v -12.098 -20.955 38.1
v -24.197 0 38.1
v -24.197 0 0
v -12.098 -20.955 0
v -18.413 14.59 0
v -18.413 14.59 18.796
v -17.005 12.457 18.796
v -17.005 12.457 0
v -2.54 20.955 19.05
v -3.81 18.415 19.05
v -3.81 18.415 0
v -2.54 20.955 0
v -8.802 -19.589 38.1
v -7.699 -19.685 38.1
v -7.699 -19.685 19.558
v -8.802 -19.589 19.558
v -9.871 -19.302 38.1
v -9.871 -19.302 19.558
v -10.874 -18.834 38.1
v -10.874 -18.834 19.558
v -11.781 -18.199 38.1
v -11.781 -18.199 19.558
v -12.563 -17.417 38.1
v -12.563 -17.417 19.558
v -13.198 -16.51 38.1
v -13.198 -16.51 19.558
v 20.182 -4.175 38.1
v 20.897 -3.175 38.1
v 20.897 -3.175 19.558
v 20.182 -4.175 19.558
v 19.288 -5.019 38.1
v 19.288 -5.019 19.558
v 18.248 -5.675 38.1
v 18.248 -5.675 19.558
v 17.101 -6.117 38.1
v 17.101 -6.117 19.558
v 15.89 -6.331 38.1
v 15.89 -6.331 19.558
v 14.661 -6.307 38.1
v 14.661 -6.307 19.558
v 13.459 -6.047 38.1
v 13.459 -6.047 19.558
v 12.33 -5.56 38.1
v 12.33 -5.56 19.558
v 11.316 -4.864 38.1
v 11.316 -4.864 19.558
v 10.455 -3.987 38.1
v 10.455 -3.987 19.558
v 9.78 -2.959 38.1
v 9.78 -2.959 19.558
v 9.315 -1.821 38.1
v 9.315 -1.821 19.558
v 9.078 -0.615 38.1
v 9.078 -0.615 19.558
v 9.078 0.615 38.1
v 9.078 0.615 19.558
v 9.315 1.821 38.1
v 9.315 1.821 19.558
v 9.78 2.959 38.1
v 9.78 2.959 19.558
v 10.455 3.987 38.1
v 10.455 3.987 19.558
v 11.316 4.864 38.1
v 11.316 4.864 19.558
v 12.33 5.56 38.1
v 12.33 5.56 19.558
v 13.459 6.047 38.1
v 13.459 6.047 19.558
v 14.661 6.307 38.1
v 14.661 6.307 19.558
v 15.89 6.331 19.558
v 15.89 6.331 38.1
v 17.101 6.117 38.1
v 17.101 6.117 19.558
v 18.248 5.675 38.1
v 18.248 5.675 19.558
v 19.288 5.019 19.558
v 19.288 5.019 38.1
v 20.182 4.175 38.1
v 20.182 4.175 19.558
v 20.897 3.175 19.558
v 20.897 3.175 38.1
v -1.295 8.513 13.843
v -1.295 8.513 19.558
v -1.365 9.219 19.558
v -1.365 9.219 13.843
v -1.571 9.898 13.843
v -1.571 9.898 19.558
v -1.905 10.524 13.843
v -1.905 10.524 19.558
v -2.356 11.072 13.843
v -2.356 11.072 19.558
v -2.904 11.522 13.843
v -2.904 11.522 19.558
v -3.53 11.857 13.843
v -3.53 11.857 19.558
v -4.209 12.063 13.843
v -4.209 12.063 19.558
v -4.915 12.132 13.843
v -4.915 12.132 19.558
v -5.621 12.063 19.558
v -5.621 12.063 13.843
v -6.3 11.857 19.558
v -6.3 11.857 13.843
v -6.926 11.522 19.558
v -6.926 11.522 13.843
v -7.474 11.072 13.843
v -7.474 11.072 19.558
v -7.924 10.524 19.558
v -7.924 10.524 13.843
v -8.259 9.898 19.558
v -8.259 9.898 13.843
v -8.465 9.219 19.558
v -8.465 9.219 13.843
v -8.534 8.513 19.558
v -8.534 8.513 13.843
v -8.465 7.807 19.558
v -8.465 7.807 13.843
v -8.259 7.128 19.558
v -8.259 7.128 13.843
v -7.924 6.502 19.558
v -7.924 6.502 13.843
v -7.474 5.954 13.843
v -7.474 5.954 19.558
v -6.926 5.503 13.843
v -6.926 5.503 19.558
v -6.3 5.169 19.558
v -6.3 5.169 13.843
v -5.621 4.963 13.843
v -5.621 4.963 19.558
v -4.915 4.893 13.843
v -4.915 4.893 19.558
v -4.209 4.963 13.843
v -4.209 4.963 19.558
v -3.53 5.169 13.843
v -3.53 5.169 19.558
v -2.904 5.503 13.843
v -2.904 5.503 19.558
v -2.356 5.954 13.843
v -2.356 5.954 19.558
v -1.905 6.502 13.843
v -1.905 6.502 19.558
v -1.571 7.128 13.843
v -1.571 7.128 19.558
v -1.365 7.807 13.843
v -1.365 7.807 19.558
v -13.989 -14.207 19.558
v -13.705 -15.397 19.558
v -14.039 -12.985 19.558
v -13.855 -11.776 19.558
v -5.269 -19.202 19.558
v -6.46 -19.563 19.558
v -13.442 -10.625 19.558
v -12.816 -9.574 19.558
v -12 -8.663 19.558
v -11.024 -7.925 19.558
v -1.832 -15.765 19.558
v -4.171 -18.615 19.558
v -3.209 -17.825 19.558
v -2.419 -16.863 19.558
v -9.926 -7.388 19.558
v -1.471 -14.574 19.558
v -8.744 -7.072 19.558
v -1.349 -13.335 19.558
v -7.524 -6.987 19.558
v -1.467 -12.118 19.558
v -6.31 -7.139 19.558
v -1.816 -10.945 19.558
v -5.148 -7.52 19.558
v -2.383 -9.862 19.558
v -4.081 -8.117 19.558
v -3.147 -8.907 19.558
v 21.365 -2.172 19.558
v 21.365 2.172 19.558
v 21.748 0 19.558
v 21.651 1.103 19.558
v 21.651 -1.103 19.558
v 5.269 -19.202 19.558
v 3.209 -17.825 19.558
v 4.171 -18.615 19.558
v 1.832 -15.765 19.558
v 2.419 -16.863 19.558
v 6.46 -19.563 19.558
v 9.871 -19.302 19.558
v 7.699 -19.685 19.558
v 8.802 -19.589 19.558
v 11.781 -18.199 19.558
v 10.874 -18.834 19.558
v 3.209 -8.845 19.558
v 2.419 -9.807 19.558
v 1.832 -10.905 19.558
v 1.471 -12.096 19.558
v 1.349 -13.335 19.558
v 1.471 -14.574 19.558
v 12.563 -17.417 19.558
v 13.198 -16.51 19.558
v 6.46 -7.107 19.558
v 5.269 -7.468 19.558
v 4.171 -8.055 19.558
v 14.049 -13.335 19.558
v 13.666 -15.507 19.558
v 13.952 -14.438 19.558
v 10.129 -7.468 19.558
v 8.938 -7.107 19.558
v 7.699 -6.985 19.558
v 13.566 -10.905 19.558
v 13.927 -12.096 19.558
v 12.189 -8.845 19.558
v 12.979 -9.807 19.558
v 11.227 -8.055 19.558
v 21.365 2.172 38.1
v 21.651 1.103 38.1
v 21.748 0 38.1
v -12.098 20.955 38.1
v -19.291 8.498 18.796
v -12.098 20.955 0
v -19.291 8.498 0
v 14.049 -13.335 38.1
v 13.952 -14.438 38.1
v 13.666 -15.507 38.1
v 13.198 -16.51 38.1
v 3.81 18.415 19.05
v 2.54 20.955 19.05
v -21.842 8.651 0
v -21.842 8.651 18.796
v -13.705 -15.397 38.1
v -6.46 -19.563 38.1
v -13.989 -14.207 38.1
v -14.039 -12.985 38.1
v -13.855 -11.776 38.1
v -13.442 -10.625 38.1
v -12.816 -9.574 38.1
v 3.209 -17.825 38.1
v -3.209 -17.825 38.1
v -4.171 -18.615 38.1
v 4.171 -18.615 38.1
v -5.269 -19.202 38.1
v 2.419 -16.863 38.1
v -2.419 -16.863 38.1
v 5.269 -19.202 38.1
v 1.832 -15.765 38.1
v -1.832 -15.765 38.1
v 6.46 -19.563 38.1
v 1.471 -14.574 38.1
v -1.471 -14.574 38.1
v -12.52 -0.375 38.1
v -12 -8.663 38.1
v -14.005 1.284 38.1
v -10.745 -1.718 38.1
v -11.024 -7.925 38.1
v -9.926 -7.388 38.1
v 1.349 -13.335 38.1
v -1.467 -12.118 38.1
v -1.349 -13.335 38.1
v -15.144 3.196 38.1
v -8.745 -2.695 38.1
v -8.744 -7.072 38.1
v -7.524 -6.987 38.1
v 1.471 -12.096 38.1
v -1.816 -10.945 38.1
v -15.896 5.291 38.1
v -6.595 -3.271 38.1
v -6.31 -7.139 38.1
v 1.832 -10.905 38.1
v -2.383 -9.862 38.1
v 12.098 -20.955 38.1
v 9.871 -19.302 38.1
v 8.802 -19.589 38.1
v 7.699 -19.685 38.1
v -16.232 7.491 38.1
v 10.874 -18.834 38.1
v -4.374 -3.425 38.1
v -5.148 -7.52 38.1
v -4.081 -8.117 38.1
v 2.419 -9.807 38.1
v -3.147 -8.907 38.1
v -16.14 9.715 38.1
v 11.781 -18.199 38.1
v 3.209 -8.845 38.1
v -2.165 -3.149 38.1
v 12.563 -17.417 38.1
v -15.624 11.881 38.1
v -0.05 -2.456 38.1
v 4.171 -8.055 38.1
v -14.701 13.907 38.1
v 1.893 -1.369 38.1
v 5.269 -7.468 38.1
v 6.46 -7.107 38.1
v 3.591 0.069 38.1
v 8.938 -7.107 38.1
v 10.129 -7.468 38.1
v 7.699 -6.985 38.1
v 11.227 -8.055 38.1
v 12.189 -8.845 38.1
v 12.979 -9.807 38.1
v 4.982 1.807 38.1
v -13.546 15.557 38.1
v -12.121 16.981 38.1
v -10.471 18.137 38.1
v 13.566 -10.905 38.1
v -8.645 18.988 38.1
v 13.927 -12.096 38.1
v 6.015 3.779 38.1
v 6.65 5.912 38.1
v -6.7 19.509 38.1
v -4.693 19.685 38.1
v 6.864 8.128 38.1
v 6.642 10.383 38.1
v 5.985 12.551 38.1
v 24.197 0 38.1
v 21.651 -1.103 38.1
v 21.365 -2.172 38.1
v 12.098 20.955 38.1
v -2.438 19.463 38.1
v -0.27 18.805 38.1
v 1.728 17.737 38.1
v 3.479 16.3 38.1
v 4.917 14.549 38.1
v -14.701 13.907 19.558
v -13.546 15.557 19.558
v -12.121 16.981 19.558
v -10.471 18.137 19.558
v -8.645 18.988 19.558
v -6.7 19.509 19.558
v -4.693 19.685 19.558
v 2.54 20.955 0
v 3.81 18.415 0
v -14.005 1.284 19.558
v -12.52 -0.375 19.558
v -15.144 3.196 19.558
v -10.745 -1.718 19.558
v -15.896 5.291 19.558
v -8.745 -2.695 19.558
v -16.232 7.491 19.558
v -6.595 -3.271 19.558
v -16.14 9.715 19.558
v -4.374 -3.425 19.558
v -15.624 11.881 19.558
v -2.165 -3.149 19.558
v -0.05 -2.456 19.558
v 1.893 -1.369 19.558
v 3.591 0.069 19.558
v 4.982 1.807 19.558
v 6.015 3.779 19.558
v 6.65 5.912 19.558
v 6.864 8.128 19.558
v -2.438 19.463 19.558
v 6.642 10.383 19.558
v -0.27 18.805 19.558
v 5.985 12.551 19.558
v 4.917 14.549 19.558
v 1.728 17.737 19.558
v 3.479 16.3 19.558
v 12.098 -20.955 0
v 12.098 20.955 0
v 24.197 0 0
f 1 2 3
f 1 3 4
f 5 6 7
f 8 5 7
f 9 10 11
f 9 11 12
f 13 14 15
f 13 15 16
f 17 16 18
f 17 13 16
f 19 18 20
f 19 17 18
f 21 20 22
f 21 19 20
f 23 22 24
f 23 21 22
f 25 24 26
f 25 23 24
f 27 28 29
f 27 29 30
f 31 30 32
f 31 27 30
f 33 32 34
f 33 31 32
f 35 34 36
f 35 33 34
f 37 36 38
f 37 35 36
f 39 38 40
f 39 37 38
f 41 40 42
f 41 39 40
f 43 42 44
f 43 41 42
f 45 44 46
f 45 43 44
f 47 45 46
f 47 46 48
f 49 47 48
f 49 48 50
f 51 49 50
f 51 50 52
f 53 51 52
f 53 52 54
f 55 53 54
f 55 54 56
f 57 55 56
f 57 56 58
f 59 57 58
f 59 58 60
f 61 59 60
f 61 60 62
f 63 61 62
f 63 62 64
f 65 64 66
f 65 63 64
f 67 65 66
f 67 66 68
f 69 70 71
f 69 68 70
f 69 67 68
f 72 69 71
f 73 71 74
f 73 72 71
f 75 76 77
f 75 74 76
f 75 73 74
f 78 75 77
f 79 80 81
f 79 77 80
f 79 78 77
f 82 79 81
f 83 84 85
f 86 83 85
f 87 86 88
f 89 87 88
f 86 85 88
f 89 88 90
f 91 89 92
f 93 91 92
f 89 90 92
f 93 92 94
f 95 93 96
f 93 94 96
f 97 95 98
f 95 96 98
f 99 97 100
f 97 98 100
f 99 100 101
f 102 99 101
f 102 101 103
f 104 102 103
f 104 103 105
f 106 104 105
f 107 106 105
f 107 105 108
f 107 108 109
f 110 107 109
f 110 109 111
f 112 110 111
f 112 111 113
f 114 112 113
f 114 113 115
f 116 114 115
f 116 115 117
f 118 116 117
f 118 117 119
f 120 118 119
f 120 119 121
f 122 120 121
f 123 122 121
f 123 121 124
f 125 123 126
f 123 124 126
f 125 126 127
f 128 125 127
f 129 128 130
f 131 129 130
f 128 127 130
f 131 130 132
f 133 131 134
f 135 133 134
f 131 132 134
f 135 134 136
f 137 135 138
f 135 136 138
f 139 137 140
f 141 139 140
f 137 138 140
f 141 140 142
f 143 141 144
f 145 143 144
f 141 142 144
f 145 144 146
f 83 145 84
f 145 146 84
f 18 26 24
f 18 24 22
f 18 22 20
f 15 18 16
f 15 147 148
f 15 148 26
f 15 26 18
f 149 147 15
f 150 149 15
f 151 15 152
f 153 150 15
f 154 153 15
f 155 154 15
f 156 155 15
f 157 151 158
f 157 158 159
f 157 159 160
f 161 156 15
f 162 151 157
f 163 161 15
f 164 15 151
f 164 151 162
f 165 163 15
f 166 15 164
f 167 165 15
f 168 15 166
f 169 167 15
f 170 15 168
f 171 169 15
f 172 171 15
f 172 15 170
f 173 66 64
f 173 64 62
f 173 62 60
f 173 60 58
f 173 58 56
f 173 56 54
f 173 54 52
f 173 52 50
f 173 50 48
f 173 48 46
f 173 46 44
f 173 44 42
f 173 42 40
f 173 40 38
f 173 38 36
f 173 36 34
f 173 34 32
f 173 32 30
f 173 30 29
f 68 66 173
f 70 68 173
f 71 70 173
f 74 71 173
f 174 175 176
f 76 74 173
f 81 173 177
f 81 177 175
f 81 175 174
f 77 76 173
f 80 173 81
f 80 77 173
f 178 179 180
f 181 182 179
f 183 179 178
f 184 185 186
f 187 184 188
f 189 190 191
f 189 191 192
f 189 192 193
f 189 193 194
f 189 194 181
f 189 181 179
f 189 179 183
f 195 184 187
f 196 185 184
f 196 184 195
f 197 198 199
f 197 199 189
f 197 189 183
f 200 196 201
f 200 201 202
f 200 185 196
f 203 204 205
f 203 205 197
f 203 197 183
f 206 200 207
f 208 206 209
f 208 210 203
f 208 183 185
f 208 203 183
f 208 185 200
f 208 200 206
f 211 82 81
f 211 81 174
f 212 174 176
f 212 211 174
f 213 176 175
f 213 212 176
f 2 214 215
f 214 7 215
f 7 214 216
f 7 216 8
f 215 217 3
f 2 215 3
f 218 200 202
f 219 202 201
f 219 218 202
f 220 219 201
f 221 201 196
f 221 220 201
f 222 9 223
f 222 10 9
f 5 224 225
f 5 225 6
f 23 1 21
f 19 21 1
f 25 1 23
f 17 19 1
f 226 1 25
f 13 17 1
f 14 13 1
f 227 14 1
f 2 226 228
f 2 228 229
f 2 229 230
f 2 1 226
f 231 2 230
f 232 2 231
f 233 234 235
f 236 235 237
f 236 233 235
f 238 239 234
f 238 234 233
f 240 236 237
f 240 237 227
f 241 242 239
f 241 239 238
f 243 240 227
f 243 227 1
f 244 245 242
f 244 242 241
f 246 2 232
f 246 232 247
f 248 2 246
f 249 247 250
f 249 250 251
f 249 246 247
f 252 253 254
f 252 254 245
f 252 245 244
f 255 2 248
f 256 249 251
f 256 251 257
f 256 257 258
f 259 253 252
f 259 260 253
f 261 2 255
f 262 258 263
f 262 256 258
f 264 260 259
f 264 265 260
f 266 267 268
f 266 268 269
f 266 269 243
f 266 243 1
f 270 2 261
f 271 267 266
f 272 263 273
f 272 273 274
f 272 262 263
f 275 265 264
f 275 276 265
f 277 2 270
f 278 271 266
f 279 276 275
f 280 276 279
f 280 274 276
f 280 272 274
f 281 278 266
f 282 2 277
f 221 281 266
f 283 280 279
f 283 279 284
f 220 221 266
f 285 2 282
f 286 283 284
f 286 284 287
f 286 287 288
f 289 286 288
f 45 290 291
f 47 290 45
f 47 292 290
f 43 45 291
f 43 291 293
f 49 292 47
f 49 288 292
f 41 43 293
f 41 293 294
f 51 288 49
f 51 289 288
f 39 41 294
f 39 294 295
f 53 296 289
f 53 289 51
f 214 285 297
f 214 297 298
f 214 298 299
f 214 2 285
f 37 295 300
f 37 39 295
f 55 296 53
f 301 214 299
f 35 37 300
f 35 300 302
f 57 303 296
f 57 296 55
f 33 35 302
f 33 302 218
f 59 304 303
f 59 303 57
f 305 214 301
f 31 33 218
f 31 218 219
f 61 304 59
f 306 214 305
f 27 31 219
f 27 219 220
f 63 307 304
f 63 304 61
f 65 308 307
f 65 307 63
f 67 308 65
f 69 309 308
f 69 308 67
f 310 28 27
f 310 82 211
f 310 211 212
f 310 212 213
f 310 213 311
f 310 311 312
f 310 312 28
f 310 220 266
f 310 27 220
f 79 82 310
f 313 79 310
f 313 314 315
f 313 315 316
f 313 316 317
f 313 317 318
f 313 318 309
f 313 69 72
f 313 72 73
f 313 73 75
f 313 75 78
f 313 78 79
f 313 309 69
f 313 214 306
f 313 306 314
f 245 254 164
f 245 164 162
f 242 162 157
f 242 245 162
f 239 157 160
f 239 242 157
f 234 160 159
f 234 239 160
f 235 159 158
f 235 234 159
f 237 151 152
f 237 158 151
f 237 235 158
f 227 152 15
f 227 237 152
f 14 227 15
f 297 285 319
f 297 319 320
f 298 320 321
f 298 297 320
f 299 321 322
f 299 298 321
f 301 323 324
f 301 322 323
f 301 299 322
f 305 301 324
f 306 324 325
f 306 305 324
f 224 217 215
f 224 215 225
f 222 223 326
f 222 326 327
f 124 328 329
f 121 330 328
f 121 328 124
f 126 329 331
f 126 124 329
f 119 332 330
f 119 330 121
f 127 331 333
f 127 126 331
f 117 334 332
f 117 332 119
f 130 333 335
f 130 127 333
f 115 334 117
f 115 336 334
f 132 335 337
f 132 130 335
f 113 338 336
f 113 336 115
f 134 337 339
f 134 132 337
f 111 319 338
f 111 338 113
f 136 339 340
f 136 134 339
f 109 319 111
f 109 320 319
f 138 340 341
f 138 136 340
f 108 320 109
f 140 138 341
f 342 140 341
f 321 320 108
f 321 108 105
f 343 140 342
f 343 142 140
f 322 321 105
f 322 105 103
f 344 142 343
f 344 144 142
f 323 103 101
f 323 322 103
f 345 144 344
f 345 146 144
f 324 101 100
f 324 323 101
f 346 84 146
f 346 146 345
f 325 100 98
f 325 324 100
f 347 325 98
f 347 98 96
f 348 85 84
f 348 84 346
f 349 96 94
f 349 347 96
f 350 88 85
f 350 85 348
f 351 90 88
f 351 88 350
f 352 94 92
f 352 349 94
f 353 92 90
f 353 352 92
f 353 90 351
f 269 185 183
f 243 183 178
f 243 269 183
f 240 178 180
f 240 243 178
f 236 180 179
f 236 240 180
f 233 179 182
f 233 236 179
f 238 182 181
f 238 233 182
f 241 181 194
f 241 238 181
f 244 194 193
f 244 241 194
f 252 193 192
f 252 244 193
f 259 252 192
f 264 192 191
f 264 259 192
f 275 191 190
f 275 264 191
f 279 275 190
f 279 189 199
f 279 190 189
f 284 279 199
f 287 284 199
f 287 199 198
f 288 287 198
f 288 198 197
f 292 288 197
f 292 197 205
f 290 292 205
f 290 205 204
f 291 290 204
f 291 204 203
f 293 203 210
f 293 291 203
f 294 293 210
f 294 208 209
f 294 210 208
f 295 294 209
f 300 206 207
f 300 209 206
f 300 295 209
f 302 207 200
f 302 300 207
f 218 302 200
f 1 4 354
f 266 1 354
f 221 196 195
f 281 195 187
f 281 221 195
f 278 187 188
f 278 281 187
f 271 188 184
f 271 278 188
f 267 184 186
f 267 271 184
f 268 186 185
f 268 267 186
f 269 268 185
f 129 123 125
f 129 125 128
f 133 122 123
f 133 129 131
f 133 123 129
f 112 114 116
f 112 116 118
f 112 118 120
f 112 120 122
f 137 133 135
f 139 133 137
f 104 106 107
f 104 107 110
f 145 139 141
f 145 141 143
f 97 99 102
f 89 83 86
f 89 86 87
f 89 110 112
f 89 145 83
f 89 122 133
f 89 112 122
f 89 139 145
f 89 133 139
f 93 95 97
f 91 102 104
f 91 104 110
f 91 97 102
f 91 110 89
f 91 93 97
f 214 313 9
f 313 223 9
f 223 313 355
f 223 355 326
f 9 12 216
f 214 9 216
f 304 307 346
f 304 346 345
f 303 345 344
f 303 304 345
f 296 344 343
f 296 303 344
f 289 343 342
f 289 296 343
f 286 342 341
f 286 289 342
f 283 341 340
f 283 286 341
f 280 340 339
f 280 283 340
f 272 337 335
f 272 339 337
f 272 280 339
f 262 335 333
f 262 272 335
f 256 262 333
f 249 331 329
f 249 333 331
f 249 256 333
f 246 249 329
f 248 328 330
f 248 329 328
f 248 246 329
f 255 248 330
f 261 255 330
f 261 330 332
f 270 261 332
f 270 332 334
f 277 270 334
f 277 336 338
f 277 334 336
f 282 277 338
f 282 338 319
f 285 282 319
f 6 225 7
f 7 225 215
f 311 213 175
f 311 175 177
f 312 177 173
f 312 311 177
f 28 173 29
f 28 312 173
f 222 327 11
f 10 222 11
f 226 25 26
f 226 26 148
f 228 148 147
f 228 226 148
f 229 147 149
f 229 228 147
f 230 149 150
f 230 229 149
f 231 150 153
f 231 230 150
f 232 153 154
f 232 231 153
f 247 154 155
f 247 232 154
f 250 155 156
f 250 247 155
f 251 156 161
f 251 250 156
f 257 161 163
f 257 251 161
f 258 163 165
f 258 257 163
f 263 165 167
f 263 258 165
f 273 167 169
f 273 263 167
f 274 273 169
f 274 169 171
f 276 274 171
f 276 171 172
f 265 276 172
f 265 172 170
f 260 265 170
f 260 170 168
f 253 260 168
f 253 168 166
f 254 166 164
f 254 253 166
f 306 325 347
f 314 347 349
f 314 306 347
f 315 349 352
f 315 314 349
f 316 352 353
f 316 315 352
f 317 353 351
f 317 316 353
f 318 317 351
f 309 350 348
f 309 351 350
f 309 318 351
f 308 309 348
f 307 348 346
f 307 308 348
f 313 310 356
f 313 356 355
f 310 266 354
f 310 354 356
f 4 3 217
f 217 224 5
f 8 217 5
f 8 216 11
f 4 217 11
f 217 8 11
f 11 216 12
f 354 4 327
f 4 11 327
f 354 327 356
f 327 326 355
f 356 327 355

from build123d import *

# Parameters (mm, degrees)
F1_DEPTH  = 38.1
F3_DEPTH  = 18.542
F5_DEPTH  = 18.796
F6_R      = 3.6195
F7_DEPTH  = 24.257
F9_DEPTH  = 18.796
F11_DEPTH = 19.05


with BuildPart() as f1:
    # F0 (on Top) → F1 (new body)
    with BuildSketch(Plane.XY):
        Polygon((-12.0983748909, -20.955), (12.0983748909, -20.955), (24.1967497817, 0), (12.0983748909, 20.955), (-12.0983748909, 20.955), (-24.1967497817, 0), align=None)
    extrude(amount=F1_DEPTH)

    # F2 (on face) → F3 (cut)
    with BuildSketch(Plane.XY.offset(38.1)):
        Polygon((-11.365140049, -19.685), (11.365140049, -19.685), (22.730280098, 0), (11.365140049, 19.685), (-11.365140049, 19.685), (-22.730280098, 0), align=None)
    extrude(amount=-F3_DEPTH, mode=Mode.SUBTRACT)

    # F4 (on face) → F5 (join)
    with BuildSketch(Plane.XY.offset(38.1)):
        with BuildLine():
            ThreePointArc((-4.692702988, 19.685), (3.4793300822, 16.3000330702), (6.864297012, 8.128))
            ThreePointArc((6.864297012, 8.128), (-7.683874715, -3.0352047683), (-14.7013585559, 13.9065000408))
            Line((-14.7013585559, 13.9065000408), (-22.730280098, 0))
            Line((-22.730280098, 0), (-13.1982271906, -16.509999936))
            ThreePointArc((-13.1982271906, -16.509999936), (-9.3424667403, -7.2013709935), (-1.3489658396, -13.335))
            ThreePointArc((-1.3489658396, -13.335), (-3.2088377669, -17.8251280484), (-7.6989658052, -19.685))
            Line((-7.6989658052, -19.685), (7.6989658396, -19.685))
            ThreePointArc((7.6989658396, -19.685), (3.2088377791, -8.8448719395), (14.0489658396, -13.335))
            ThreePointArc((14.0489658396, -13.335), (13.8325948227, -14.9785009883), (13.1982271, -16.510000093))
            Line((13.1982271, -16.510000093), (20.8971929349, -3.1750001012))
            ThreePointArc((20.8971929349, -3.1750001012), (9.0479316793, 1.601e-07), (20.897193095, 3.1749998238))
            Line((20.897193095, 3.1749998238), (11.365140049, 19.685))
            Line((11.365140049, 19.685), (-4.692702988, 19.685))
        make_face()
        with BuildLine():
            ThreePointArc((-7.6989658052, -19.685), (-10.8739658568, -18.8342613042), (-13.1982271906, -16.509999936))
            Line((-13.1982271906, -16.509999936), (-11.365140049, -19.685))
            Line((-11.365140049, -19.685), (-7.6989658052, -19.685))
        make_face()
        with BuildLine():
            Line((11.365140049, -19.685), (13.1982271, -16.510000093))
            ThreePointArc((13.1982271, -16.510000093), (10.8739657932, -18.8342613409), (7.6989658396, -19.685))
            Line((7.6989658396, -19.685), (11.365140049, -19.685))
        make_face()
        with BuildLine():
            Line((22.730280098, 0), (20.897193095, 3.1749998238))
            ThreePointArc((20.897193095, 3.1749998238), (21.5315607026, 1.6435008381), (21.7479316793, 0))
            ThreePointArc((21.7479316793, 0), (21.5315606611, -1.6435009928), (20.8971929349, -3.1750001012))
            Line((20.8971929349, -3.1750001012), (22.730280098, 0))
        make_face()
        with BuildLine():
            ThreePointArc((-14.7013585559, 13.9065000408), (-10.4712029675, 18.1366556033), (-4.692702988, 19.685))
            Line((-4.692702988, 19.685), (-11.365140049, 19.685))
            Line((-11.365140049, 19.685), (-14.7013585559, 13.9065000408))
        make_face()
    extrude(amount=-F5_DEPTH)

    # F6 (on face) → F7 (cut)
    with BuildSketch(Plane.XY.offset(38.1)):
        with Locations((-4.914952988, 8.512948292)):
            Circle(F6_R)
    extrude(amount=-F7_DEPTH, mode=Mode.SUBTRACT)

    # F8 (on face) → F9 (join)
    with BuildSketch(Plane(origin=(0, 0, 0), x_dir=(1, 0, 0), z_dir=(0, 0, -1))):
        Polygon((-20.1272964094, -11.6205), (-18.1475623363, -10.4775), (-19.2905623363, -8.4977659269), (-21.8417964094, -8.6508988904), align=None)
        Polygon((-17.0045623363, -12.4572340731), (-18.1475623363, -10.4775), (-20.1272964094, -11.6205), (-18.4127964094, -14.5901011096), align=None)
    extrude(amount=-F9_DEPTH)

    # F10 (on face) → F11 (cut)
    with BuildSketch(Plane(origin=(0, 0, 0), x_dir=(1, 0, 0), z_dir=(0, 0, -1))):
        Polygon((-2.54, -20.955), (0, -20.955), (0, -18.415), (-3.81, -18.415), align=None)
        Polygon((0, -18.415), (0, -20.955), (2.54, -20.955), (3.81, -18.415), align=None)
    extrude(amount=-F11_DEPTH, mode=Mode.SUBTRACT)


solid = f1.part
